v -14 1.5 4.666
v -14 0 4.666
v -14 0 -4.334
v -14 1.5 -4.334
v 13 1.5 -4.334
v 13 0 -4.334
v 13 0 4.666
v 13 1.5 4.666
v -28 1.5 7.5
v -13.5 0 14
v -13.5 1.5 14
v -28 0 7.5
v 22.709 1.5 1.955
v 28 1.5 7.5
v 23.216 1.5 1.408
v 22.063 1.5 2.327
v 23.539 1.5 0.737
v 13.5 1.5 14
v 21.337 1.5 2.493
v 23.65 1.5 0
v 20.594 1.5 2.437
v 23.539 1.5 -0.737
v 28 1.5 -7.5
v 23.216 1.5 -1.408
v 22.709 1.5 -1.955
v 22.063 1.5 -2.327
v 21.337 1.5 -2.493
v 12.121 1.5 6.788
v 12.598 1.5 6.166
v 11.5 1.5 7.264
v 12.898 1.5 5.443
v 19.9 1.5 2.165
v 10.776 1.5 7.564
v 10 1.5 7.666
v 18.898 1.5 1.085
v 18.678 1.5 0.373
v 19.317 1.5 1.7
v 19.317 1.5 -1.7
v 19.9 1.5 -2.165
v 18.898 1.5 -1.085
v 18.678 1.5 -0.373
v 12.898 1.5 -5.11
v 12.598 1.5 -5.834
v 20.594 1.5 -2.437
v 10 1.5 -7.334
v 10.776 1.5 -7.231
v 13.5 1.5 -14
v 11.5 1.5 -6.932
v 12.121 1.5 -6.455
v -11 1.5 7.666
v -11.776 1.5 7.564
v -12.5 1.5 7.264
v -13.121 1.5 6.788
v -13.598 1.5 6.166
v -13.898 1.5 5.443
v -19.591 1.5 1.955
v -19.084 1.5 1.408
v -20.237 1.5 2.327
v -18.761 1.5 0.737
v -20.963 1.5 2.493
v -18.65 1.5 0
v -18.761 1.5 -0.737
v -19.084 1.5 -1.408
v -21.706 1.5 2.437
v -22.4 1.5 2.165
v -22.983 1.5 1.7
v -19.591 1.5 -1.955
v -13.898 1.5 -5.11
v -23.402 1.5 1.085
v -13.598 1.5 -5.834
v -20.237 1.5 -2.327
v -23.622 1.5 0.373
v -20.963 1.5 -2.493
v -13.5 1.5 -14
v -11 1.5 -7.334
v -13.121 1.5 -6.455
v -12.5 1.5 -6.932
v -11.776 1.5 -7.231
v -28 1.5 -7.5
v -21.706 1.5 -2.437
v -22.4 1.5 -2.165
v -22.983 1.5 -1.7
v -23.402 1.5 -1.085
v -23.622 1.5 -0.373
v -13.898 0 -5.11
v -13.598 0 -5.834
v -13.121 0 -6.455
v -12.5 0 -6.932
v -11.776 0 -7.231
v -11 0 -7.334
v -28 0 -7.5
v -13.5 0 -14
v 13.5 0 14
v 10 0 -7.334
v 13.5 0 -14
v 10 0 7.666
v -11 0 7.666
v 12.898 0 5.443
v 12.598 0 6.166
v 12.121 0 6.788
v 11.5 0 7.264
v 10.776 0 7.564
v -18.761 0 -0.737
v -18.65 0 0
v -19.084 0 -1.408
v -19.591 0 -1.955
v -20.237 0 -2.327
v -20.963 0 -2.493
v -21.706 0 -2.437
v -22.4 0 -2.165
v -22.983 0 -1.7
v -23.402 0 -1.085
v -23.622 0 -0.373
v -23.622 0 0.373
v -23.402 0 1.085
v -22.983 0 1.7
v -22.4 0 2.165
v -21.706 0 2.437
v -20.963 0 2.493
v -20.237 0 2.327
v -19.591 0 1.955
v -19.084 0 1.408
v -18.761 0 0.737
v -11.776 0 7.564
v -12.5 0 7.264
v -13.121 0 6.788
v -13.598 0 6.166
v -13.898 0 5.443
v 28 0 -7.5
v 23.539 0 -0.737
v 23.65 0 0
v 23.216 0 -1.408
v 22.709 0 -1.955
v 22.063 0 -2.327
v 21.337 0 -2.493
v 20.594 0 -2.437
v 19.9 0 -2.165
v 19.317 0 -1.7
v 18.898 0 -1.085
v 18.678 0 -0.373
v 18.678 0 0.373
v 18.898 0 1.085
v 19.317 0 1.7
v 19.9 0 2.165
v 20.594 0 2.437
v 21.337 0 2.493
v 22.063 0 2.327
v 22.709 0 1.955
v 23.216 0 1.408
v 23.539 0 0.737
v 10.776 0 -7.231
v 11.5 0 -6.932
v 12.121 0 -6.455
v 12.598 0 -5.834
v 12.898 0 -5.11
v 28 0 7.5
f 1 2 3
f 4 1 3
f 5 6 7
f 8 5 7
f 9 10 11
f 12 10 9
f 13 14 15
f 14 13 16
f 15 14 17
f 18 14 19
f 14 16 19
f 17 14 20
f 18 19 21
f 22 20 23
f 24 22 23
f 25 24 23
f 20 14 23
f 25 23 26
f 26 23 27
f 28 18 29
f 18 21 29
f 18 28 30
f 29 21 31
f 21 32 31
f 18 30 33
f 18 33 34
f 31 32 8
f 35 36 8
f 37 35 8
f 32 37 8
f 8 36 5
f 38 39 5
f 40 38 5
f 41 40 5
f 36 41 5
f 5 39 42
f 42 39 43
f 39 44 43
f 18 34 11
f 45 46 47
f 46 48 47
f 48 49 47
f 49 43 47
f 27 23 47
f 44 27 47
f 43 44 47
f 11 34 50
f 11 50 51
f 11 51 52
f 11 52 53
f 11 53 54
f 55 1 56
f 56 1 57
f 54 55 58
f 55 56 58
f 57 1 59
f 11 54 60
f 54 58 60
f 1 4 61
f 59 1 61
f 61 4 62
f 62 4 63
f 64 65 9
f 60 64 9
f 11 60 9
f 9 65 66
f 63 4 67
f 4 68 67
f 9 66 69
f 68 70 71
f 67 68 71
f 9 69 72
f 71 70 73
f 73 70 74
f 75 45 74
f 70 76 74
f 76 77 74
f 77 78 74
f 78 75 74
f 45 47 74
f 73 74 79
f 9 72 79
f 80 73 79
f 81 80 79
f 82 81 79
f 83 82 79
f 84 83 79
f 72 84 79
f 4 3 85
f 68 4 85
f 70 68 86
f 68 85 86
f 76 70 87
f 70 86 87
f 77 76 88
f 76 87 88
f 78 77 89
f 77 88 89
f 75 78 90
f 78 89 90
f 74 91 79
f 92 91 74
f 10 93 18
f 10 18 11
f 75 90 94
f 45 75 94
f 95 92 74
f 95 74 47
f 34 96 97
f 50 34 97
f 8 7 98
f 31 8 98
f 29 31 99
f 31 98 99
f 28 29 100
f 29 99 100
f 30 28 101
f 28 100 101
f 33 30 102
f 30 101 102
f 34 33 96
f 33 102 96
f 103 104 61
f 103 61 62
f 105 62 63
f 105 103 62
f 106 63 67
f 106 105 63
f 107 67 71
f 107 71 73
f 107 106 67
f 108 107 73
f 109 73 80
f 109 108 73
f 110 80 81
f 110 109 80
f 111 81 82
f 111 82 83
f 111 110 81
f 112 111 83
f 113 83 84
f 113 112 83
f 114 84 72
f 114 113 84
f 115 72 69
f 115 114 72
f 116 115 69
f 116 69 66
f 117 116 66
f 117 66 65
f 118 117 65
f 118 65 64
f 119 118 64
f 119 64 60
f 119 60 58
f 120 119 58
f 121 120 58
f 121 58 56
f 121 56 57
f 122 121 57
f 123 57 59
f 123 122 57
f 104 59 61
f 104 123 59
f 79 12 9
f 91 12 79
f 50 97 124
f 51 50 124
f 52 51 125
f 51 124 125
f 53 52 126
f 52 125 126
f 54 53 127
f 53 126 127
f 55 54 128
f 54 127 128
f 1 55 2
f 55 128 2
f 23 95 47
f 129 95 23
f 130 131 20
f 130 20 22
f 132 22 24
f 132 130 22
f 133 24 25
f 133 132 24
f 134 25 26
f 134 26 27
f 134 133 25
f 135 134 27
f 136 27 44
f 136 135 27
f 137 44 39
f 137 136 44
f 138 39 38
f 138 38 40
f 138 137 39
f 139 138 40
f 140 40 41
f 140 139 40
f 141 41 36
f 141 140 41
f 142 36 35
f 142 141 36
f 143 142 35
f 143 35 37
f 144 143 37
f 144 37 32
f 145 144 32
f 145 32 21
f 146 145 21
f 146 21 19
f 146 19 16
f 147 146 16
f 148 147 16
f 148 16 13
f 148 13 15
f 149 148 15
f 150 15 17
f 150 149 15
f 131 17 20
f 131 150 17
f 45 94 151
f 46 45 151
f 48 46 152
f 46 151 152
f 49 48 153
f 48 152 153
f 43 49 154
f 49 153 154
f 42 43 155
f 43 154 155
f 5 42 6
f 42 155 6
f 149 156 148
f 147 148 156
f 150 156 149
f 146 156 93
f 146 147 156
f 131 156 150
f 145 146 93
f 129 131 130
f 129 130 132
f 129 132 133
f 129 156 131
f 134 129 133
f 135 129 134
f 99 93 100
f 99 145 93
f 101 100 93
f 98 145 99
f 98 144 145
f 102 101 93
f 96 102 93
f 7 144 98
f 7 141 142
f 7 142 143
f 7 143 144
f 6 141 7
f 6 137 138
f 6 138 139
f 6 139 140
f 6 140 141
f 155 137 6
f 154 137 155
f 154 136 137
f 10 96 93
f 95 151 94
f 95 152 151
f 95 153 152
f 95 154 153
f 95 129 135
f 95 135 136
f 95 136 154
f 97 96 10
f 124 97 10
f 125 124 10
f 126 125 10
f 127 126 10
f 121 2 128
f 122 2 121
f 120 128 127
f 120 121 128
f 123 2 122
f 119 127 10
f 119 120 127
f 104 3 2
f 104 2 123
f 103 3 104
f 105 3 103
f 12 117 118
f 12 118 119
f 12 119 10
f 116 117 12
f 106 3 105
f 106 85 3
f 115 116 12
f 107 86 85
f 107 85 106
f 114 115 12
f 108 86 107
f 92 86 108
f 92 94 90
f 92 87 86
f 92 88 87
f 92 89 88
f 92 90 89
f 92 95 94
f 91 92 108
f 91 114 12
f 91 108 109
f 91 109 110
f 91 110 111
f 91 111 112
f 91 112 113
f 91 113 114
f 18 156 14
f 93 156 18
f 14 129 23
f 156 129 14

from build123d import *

# Parameters (mm, degrees)
SKETCH1_R           = 2.5
BOSS_EXTRUDE1_DEPTH = 1.5


with BuildPart() as part:
    # Sketch1 → Boss-Extrude1 (new body)
    with BuildSketch(Plane(origin=(0, 0, 0), x_dir=(1, 0, 0), z_dir=(0, 1, 0))):
        Polygon((-13.5, 14), (13.5, 14), (28, 7.5), (28, -7.5), (13.5, -14), (-13.5, -14), (-28, -7.5), (-28, 7.5), align=None)
        with Locations((21.15, 0)):
            Circle(SKETCH1_R, mode=Mode.SUBTRACT)
        with Locations((-21.15, 0)):
            Circle(SKETCH1_R, mode=Mode.SUBTRACT)
        with BuildLine():
            Line((13, 4.333683406), (13, -4.666316594))
            ThreePointArc((13, -4.666316594), (12.121320344, -6.787636938), (10, -7.666316594))
            Line((10, -7.666316594), (-11, -7.666316594))
            ThreePointArc((-11, -7.666316594), (-13.121320344, -6.787636938), (-14, -4.666316594))
            Line((-14, -4.666316594), (-14, 4.333683406))
            ThreePointArc((-14, 4.333683406), (-13.121320344, 6.455003749), (-11, 7.333683406))
            Line((-11, 7.333683406), (10, 7.333683406))
            ThreePointArc((10, 7.333683406), (12.121320344, 6.455003749), (13, 4.333683406))
        make_face(mode=Mode.SUBTRACT)
    extrude(amount=BOSS_EXTRUDE1_DEPTH)


solid = part.part
